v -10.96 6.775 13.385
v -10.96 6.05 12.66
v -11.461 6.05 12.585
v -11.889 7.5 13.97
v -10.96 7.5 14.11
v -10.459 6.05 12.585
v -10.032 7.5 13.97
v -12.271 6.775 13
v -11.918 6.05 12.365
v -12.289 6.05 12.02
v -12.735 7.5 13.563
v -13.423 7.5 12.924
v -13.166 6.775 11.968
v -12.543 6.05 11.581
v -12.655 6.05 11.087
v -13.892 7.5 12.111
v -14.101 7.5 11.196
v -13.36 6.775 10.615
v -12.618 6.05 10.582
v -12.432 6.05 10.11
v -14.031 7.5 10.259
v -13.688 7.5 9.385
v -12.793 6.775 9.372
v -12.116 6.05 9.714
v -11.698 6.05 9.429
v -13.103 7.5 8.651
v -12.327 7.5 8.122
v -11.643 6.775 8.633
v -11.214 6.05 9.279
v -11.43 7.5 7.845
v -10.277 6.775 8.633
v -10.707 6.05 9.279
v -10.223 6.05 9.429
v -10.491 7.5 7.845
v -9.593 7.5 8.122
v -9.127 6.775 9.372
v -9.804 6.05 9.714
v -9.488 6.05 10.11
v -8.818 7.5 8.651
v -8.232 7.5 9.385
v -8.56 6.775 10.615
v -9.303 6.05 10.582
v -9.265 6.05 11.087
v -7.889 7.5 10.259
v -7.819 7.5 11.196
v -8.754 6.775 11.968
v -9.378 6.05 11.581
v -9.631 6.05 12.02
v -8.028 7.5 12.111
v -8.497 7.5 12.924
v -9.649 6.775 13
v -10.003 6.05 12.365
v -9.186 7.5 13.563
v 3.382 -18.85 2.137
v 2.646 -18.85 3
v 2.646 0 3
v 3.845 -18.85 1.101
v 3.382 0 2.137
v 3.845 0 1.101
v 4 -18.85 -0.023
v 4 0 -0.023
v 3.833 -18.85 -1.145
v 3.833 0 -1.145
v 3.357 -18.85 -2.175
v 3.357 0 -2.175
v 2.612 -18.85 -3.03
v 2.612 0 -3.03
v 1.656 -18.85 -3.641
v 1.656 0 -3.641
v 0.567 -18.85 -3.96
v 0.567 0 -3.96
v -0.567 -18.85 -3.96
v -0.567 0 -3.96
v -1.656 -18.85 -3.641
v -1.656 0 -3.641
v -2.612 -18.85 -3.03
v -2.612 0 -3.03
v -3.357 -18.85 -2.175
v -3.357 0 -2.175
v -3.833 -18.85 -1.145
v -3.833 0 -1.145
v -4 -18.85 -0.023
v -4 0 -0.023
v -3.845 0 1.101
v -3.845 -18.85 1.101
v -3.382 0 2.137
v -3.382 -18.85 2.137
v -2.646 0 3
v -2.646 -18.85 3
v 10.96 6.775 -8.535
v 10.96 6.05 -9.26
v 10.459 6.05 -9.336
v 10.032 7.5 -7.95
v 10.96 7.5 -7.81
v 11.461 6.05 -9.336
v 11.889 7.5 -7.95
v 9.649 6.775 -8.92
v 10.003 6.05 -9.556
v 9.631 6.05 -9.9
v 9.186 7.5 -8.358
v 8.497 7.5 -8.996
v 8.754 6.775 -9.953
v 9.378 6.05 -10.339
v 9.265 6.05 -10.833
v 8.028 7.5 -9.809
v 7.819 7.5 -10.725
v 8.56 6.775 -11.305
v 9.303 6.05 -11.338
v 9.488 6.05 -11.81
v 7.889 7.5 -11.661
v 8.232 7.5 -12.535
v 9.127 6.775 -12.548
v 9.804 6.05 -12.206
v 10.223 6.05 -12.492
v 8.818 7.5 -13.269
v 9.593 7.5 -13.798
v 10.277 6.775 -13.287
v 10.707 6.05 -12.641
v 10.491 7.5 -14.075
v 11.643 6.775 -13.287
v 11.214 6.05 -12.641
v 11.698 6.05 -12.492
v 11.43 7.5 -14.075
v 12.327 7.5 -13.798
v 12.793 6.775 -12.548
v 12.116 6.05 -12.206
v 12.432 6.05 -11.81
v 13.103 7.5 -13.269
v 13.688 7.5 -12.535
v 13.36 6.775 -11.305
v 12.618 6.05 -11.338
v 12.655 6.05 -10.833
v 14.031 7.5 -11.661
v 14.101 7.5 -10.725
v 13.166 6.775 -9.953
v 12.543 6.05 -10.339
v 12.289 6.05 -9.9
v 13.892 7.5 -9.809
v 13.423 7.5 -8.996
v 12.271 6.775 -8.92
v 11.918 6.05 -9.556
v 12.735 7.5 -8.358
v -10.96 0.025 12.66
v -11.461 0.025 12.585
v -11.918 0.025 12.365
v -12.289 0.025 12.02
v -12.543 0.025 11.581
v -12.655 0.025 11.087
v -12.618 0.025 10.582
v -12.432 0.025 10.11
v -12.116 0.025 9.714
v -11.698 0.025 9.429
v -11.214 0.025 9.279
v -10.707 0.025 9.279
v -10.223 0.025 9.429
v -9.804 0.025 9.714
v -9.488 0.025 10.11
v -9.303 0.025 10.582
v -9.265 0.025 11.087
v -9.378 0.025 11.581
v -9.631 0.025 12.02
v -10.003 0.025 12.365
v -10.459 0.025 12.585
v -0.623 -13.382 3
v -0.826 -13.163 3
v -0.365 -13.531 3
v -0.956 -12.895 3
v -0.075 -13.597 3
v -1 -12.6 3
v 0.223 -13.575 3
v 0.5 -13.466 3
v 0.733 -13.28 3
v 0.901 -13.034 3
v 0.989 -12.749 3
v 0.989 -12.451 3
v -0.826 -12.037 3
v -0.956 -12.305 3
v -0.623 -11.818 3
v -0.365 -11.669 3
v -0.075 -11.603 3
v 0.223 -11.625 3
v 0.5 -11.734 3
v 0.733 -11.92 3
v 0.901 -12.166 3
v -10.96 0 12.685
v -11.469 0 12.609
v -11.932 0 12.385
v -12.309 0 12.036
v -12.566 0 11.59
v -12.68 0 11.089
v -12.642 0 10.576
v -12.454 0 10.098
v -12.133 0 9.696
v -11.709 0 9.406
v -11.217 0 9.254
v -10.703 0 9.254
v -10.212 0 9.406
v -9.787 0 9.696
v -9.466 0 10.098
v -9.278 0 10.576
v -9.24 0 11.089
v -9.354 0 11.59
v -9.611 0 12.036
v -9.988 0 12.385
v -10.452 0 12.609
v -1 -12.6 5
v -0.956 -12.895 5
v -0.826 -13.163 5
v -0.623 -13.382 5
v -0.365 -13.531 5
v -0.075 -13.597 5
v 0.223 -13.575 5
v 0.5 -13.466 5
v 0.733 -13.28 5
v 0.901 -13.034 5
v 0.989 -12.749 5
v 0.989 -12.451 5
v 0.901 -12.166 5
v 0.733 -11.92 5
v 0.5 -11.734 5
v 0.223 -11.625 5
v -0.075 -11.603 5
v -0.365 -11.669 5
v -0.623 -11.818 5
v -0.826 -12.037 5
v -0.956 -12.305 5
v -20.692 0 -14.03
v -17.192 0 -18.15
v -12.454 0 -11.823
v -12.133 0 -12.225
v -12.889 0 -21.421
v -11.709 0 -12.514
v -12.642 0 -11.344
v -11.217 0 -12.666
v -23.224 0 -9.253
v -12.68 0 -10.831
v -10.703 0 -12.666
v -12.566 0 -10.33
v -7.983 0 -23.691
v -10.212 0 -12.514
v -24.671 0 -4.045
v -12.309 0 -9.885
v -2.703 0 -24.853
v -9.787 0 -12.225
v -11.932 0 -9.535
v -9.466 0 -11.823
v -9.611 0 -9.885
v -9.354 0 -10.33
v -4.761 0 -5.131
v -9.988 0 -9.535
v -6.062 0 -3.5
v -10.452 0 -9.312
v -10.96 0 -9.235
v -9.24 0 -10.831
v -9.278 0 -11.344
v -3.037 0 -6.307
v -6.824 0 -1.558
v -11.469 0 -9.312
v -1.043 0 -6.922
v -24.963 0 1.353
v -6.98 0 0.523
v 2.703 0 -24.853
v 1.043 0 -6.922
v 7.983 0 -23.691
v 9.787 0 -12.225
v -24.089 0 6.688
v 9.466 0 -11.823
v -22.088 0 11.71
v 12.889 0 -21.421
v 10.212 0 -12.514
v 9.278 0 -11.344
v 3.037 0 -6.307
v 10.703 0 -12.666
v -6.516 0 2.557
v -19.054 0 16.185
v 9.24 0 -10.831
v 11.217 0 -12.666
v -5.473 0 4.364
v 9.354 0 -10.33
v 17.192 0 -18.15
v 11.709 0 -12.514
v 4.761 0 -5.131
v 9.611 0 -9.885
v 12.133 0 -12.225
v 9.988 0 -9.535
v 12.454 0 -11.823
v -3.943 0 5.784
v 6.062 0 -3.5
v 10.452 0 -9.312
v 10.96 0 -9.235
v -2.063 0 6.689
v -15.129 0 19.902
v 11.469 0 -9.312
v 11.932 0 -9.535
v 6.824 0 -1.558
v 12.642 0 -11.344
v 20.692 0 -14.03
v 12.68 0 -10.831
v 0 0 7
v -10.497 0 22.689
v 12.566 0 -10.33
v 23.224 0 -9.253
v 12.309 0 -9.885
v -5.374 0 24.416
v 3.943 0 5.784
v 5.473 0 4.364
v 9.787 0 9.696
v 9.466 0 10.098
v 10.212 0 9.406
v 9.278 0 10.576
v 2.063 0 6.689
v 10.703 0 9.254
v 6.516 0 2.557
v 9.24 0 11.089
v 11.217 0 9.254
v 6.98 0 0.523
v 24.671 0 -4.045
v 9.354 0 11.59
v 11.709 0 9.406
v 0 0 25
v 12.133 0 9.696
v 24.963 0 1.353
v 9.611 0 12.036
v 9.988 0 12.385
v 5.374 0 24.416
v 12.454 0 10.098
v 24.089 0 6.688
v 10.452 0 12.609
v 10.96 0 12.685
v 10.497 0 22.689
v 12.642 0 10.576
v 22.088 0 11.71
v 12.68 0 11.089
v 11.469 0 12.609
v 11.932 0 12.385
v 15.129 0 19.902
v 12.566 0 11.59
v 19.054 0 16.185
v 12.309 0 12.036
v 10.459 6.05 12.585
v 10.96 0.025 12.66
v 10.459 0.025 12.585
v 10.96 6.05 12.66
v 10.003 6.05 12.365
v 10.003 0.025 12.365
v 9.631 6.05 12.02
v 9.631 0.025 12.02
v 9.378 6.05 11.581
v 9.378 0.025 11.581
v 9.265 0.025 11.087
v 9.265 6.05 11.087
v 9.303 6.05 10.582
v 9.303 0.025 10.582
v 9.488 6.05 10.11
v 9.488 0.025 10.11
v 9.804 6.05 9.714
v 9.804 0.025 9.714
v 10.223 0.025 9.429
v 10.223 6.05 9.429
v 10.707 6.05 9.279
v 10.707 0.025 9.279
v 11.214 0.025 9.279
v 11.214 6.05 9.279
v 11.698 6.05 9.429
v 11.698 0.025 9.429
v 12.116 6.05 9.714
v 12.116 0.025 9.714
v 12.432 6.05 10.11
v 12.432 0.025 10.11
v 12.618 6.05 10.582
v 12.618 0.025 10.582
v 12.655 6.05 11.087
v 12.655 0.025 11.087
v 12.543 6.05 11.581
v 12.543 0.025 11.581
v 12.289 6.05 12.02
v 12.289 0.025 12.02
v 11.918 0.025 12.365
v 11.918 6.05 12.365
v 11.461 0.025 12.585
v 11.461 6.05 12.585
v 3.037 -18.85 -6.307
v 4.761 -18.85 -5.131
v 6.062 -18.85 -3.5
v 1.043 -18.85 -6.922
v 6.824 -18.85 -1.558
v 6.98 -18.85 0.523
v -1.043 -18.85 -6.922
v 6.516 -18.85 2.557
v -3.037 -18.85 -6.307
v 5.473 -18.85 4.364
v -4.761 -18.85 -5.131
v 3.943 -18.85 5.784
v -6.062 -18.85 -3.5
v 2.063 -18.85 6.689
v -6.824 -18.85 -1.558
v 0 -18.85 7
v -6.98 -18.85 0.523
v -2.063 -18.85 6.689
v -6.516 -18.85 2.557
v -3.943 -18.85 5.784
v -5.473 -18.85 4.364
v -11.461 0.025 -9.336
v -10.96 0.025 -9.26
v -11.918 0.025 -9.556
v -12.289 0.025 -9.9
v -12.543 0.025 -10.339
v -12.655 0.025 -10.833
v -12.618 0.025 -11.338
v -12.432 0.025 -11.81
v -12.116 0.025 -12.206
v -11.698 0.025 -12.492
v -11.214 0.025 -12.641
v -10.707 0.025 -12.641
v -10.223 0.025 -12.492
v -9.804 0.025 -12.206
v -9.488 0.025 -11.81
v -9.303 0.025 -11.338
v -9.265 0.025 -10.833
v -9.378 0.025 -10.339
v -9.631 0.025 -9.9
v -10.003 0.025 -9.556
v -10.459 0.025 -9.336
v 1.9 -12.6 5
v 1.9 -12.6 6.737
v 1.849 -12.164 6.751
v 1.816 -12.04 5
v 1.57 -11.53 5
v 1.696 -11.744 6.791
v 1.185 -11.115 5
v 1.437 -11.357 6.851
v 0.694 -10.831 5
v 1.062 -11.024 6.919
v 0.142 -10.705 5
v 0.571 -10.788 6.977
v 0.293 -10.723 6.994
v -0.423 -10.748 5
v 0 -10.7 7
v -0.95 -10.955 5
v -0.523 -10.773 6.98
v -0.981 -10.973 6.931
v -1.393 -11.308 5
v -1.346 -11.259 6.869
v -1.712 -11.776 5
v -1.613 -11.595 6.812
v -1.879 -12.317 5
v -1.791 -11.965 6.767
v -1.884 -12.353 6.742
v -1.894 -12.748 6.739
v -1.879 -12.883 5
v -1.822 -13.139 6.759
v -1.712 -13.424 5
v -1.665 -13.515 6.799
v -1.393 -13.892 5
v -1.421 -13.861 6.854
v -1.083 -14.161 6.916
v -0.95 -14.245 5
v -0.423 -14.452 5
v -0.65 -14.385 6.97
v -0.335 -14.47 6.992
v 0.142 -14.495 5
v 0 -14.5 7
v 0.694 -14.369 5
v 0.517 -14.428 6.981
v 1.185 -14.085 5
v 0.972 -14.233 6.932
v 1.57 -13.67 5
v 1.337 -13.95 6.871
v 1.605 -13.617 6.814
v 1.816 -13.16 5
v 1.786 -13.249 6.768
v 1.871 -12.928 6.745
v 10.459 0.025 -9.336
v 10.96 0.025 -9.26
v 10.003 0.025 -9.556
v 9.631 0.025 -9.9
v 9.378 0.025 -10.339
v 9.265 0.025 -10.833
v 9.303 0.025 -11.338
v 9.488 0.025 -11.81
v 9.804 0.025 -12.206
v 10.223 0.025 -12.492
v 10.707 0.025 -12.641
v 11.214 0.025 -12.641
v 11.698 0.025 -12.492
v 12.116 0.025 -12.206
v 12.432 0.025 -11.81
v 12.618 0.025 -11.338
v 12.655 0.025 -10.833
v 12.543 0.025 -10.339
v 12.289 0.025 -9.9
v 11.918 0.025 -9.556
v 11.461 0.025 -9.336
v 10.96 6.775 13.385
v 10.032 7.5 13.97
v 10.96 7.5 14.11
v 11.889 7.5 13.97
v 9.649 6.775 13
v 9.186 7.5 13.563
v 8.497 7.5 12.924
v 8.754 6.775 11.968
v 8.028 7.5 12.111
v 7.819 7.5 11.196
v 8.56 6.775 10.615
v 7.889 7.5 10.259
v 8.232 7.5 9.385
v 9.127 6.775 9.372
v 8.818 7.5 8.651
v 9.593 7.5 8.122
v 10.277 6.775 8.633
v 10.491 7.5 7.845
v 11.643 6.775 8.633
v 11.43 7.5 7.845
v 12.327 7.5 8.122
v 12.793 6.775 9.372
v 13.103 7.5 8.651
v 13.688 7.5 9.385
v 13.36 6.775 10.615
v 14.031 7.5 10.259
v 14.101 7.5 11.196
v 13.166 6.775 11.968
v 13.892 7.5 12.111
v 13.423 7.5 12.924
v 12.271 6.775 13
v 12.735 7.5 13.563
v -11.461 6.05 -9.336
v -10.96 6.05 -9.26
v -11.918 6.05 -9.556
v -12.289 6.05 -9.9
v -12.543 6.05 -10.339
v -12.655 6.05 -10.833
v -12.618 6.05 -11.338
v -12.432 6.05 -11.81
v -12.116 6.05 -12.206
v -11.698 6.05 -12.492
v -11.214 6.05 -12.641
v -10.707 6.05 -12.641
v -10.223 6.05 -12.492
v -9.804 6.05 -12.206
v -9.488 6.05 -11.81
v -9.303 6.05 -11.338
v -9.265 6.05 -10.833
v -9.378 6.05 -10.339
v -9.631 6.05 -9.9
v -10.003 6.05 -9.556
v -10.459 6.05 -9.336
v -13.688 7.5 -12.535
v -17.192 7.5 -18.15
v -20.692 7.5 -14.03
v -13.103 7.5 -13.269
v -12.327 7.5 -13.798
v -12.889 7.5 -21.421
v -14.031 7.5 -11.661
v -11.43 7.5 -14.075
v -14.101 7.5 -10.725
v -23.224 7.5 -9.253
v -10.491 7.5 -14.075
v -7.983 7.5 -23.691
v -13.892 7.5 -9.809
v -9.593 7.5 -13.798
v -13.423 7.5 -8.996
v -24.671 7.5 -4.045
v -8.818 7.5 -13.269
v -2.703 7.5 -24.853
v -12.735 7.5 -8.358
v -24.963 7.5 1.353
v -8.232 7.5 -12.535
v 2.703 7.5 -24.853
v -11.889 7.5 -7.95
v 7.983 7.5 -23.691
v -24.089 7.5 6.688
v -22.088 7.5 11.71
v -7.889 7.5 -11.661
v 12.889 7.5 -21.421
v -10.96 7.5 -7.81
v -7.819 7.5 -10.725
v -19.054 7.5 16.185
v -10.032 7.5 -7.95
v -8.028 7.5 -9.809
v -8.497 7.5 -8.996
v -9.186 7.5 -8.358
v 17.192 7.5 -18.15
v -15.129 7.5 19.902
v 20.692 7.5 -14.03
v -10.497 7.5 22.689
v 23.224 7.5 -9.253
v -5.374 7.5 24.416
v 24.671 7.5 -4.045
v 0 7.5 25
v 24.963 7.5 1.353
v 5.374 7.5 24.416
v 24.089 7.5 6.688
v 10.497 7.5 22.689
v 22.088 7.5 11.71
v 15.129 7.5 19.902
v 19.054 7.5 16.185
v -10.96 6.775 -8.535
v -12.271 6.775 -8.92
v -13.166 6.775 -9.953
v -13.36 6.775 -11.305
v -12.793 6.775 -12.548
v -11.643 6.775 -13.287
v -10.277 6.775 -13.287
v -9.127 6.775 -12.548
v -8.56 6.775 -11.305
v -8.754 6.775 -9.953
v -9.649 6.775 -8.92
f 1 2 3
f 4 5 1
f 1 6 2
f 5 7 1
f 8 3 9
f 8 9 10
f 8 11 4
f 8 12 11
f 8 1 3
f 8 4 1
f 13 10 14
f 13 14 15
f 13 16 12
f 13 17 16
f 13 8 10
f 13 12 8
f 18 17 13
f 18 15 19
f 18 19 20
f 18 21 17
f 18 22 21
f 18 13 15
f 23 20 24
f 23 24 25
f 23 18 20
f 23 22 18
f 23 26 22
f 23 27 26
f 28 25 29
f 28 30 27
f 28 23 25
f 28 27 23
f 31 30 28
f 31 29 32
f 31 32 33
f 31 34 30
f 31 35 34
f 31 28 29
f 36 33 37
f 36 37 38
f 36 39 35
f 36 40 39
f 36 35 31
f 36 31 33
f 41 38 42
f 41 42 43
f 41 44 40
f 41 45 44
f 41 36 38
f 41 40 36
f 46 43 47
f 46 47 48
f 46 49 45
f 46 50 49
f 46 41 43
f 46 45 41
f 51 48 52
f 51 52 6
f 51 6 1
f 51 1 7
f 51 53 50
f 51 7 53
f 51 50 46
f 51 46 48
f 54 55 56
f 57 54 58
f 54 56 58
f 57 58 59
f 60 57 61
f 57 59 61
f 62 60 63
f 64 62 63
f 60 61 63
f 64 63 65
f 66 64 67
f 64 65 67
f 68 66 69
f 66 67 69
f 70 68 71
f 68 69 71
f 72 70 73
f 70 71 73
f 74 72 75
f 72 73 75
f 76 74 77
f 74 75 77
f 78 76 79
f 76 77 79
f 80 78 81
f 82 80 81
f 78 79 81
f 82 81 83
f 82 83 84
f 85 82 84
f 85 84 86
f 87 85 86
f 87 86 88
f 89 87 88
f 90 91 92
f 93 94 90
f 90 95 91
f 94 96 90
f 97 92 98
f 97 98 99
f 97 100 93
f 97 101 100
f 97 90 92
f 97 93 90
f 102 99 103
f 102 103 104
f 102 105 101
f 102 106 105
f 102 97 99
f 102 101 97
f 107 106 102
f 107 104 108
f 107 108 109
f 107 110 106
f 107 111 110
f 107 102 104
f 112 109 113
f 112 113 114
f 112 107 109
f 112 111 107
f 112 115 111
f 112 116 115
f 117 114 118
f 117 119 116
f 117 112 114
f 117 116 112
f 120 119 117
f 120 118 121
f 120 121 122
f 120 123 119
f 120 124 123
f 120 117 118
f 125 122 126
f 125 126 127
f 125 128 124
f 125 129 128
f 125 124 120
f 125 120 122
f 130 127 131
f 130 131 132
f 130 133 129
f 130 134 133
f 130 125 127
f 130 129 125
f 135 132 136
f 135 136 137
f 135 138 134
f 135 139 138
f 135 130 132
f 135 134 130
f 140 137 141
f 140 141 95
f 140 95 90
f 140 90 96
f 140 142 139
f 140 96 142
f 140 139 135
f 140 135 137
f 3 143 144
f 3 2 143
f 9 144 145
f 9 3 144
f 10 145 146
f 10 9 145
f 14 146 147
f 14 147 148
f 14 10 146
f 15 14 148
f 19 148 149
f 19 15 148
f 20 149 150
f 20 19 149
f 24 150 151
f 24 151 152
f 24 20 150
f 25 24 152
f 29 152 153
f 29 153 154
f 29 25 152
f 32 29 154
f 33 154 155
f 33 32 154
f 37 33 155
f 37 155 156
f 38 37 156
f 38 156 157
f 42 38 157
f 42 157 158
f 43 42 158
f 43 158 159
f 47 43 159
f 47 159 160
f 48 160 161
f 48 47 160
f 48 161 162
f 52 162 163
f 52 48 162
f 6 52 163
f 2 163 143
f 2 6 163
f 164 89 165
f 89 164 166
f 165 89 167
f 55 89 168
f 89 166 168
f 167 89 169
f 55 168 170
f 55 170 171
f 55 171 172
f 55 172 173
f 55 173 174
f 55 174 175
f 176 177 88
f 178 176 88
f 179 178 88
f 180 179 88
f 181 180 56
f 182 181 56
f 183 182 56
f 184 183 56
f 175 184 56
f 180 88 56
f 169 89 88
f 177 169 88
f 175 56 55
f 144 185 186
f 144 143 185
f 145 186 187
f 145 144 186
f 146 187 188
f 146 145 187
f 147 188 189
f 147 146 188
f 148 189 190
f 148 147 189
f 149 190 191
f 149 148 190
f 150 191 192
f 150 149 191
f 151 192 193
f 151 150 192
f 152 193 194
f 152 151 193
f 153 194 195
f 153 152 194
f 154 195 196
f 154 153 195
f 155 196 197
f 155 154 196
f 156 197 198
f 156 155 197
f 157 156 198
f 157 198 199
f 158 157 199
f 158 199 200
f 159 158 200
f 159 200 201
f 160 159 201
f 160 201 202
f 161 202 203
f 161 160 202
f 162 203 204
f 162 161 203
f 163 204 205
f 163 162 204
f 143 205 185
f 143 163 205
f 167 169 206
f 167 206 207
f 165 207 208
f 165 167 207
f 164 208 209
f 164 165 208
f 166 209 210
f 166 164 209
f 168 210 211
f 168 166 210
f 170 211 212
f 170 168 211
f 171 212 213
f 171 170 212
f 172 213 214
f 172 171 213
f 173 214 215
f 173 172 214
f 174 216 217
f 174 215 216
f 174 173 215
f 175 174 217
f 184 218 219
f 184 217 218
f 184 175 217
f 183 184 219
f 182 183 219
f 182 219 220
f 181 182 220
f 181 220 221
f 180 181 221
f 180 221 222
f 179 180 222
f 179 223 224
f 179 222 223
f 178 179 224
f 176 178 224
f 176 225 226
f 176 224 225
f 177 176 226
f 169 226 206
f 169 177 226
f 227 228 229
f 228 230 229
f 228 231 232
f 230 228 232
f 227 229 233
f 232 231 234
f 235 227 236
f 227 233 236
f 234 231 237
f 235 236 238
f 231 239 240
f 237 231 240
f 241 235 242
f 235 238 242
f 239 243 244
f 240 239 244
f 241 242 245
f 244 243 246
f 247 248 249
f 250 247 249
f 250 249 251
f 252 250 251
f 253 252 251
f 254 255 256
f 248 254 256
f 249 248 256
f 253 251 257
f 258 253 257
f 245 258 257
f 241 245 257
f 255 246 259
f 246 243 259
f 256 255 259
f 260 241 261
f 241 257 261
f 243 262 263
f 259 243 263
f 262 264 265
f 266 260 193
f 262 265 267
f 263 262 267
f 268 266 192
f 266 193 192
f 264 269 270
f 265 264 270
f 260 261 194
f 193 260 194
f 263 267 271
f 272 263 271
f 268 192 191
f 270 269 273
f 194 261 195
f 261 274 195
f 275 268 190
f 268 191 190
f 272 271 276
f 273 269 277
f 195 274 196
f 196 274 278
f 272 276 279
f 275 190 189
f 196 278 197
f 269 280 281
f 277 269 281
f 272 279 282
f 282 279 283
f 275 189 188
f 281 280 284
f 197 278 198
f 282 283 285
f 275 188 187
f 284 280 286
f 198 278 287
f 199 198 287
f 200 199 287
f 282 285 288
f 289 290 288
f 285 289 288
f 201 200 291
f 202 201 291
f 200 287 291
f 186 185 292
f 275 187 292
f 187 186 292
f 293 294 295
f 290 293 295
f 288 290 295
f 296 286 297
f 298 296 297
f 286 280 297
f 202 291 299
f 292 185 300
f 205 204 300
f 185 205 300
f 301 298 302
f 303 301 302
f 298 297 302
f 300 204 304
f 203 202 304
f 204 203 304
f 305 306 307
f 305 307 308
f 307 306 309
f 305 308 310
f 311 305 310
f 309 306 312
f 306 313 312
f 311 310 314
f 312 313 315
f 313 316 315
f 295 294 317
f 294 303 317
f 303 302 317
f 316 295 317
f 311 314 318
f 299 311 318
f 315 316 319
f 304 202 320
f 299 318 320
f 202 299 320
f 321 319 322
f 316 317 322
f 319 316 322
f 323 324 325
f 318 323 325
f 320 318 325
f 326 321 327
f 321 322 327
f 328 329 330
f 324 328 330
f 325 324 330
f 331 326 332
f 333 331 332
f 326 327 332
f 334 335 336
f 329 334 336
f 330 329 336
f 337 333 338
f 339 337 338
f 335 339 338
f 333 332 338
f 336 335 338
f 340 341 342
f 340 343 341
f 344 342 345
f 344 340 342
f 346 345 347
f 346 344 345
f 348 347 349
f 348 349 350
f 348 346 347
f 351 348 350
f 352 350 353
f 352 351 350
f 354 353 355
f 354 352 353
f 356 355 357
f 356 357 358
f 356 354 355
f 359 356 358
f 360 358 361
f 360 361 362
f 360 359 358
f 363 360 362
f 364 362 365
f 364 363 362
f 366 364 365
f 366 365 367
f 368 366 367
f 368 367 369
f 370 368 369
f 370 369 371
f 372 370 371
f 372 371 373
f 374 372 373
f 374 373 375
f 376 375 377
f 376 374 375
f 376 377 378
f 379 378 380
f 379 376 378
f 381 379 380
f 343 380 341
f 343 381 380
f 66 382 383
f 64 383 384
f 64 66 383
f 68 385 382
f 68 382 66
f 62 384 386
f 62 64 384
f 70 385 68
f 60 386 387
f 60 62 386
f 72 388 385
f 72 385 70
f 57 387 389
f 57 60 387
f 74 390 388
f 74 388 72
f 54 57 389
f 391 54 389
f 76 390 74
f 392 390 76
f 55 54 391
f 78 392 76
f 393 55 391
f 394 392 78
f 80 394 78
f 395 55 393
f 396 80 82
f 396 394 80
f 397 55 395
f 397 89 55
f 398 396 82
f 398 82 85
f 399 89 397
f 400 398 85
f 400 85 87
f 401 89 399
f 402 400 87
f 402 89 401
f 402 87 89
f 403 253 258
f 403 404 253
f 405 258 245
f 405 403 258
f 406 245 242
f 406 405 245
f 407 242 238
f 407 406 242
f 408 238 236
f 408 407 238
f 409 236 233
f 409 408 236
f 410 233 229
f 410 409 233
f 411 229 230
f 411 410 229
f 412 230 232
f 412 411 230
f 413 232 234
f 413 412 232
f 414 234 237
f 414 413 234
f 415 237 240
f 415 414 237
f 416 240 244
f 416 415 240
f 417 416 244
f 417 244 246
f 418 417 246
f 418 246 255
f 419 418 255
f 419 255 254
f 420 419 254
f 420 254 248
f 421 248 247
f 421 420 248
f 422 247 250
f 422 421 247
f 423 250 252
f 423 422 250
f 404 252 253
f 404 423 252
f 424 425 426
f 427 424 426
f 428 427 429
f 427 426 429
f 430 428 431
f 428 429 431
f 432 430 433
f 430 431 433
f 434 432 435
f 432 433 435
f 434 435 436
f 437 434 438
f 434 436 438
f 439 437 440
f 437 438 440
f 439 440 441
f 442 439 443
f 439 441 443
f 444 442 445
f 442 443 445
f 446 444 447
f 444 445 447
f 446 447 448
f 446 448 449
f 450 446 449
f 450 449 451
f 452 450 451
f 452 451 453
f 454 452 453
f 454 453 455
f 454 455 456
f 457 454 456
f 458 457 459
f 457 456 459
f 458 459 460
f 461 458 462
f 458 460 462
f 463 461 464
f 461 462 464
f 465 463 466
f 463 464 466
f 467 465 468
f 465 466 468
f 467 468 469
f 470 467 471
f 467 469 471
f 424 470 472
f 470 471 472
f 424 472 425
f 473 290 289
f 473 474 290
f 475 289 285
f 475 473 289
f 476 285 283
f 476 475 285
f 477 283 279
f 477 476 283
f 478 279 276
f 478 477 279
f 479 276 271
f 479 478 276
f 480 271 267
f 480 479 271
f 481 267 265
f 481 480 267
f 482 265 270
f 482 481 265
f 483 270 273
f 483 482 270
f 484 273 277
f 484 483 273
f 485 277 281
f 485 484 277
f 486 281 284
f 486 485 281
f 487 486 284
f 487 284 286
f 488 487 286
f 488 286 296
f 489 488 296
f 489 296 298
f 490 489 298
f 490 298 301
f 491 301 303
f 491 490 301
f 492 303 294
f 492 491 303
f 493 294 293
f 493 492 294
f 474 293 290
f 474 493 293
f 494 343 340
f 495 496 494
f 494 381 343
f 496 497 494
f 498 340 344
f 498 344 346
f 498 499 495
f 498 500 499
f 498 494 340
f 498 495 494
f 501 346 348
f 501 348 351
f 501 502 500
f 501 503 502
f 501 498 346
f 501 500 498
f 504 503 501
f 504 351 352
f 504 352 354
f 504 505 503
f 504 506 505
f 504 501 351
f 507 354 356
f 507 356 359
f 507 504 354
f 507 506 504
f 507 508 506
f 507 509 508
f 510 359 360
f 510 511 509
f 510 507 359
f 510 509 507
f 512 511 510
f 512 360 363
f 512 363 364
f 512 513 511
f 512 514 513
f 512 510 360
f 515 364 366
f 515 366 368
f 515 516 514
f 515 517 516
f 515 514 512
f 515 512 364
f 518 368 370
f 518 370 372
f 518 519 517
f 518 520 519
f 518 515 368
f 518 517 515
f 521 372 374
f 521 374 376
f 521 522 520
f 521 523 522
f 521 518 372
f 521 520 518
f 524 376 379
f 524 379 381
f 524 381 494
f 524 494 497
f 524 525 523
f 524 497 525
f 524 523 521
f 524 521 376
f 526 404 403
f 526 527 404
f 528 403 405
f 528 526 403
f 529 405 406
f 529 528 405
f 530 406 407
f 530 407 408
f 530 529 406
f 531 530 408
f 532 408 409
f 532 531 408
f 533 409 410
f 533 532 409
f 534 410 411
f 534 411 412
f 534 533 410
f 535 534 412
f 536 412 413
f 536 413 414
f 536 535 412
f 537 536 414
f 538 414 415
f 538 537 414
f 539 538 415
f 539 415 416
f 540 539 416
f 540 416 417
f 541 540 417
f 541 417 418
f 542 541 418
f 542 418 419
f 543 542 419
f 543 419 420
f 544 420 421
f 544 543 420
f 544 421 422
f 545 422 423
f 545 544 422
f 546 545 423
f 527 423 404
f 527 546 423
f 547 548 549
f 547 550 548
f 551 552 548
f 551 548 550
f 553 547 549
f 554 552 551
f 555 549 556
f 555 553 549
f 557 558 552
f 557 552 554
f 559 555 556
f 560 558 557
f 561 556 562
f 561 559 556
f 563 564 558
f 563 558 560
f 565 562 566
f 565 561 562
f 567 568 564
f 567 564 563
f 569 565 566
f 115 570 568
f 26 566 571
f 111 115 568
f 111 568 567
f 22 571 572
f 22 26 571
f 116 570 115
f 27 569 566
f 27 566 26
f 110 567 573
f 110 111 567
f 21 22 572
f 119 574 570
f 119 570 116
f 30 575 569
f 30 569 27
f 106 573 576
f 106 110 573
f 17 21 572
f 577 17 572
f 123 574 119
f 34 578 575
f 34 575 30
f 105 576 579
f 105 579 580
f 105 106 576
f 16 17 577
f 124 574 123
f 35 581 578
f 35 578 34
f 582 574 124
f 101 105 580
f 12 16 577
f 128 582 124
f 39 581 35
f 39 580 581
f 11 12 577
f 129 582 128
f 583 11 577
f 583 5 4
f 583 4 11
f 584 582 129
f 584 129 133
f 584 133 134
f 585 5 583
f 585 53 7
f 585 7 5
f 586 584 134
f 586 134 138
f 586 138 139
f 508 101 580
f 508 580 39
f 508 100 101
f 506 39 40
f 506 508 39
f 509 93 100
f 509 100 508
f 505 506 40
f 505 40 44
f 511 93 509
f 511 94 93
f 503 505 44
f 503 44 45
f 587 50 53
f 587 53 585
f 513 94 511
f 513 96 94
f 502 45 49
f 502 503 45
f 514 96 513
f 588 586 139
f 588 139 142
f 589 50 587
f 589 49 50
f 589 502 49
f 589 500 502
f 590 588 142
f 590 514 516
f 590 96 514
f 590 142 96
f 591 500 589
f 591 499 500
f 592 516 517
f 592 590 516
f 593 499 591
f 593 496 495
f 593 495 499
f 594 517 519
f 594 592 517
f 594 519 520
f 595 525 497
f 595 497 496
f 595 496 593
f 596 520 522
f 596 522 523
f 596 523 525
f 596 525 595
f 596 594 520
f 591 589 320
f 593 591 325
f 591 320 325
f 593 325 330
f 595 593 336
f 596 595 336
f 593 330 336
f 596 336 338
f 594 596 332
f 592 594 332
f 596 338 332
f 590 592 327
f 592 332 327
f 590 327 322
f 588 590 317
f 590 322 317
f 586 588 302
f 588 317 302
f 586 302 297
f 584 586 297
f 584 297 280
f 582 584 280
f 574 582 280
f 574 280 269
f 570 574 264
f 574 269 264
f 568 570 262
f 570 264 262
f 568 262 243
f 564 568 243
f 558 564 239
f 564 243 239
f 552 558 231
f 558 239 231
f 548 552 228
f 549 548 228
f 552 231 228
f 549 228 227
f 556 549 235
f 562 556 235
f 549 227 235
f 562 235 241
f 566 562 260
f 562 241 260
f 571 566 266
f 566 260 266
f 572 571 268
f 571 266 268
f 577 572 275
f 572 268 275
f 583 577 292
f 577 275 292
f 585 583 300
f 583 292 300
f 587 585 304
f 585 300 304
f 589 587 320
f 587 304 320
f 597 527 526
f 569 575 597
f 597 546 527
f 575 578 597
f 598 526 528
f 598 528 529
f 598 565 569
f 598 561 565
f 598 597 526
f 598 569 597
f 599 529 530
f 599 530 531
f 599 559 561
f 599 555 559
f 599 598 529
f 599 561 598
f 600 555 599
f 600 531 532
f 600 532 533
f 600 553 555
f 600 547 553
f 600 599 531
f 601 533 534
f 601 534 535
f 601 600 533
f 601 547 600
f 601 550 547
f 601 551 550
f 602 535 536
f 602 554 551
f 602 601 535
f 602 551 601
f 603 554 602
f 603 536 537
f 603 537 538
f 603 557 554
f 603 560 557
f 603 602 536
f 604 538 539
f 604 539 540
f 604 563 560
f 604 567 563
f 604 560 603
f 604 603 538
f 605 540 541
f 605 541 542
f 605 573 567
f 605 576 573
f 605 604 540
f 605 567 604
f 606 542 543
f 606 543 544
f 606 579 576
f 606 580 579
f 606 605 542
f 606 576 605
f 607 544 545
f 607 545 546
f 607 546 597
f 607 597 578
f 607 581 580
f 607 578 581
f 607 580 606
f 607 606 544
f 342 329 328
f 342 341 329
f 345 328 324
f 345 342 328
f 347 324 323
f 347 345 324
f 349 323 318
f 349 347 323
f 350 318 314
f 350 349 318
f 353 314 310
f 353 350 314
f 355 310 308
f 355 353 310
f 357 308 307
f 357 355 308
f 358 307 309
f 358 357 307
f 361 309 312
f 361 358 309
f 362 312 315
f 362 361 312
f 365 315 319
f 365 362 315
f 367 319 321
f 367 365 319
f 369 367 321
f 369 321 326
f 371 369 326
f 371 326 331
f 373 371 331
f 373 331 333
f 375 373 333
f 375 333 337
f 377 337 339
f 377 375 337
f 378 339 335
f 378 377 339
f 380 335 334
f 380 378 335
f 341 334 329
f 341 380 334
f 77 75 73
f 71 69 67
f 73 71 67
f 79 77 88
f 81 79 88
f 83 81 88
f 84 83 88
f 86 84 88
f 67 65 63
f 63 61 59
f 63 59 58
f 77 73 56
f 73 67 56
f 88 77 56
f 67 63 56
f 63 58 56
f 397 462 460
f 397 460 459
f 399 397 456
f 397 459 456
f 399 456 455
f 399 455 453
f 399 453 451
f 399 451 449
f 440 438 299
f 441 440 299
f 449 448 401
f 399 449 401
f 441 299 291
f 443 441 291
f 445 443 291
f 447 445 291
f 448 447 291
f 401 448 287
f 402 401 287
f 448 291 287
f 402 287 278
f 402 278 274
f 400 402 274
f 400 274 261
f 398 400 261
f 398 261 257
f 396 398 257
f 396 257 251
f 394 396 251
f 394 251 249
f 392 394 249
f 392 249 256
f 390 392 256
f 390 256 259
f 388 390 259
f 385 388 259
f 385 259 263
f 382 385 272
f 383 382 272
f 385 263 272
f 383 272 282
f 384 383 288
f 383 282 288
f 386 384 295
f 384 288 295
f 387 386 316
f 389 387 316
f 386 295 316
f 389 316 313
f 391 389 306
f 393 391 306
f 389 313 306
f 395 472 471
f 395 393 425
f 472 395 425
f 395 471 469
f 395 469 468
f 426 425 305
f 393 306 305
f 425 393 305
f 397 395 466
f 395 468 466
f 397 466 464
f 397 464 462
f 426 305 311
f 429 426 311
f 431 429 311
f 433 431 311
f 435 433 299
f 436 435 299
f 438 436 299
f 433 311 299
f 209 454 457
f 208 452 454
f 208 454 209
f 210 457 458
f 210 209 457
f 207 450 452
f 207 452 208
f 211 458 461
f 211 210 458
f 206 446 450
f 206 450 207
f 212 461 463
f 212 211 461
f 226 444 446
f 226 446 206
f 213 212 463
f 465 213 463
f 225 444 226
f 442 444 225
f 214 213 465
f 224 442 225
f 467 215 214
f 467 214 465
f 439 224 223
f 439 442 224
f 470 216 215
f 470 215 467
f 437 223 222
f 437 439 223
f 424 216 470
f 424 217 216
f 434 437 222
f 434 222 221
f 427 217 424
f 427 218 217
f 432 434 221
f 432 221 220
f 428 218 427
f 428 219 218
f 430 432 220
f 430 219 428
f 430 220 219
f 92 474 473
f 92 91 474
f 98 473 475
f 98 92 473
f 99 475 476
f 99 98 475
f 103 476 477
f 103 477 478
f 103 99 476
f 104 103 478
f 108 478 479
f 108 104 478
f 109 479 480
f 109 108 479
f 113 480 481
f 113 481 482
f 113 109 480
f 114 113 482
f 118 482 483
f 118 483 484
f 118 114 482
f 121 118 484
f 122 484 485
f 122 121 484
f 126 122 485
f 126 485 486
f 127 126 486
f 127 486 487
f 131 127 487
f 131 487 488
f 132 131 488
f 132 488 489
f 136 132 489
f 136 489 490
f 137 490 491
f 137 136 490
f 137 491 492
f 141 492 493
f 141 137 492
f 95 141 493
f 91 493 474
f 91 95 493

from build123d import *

# Parameters (mm, degrees)
SKETCH1_R                                      = 25
BOSS_EXTRUDE1_DEPTH                            = 7.5
CSK_FOR_M3_FLAT_HEAD_MACHINE_SCREW1_AT_2_COUNT = 2
CSK_FOR_M3_FLAT_HEAD_MACHINE_SCREW1_AT_2_PITCH = 21.920310217
CSK_FOR_M3_FLAT_HEAD_MACHINE_SCREW1_AT_3_COUNT = 2
CSK_FOR_M3_FLAT_HEAD_MACHINE_SCREW1_AT_3_PITCH = 31
CSK_FOR_M3_FLAT_HEAD_MACHINE_SCREW1_AT_4_COUNT = 2
CSK_FOR_M3_FLAT_HEAD_MACHINE_SCREW1_AT_4_PITCH = 21.920310217
SKETCH6_R                                      = 7
BOSS_EXTRUDE2_DEPTH                            = 18.85
SKETCH7_R                                      = 1
CUT_EXTRUDE1_DEPTH                             = 10.5
SKETCH11_R                                     = 1.9
CUT_EXTRUDE2_DEPTH                             = 2


with BuildPart() as part:
    # Sketch1 → Boss-Extrude1 (new body)
    with BuildSketch(Plane(origin=(0, 0, 0), x_dir=(1, 0, 0), z_dir=(0, 1, 0))):
        with Locations(Location((0, 0, 0), (0, 0, 270))):
            Circle(SKETCH1_R)
    extrude(amount=BOSS_EXTRUDE1_DEPTH)

    # Sketch5 → CSK for M3 Flat Head Machine Screw1 (revolve, cut)
    with BuildSketch(Plane(origin=(-10.960155108, 7.5, -10.960155108), x_dir=(0, 0, 1), z_dir=(1, 0, 0))):
        Polygon((0, 0), (0, 7.5), (1.725, 7.5), (1.7, 7.475), (1.7, 1.45), (3.15, 0), align=None)
    csk_for_m3_flat_head_machine_screw1 = revolve(axis=Axis((-10.960155108, 13.85, -10.960155108), (0, -1, 0)), mode=Mode.SUBTRACT)

    # CSK for M3 Flat Head Machine Screw1 at 2: CSK for M3 Flat Head Machine Screw1 ×2
    with Locations(*[(i * CSK_FOR_M3_FLAT_HEAD_MACHINE_SCREW1_AT_2_PITCH, 0, 0) for i in range(1, CSK_FOR_M3_FLAT_HEAD_MACHINE_SCREW1_AT_2_COUNT)]):
        add(csk_for_m3_flat_head_machine_screw1, mode=Mode.SUBTRACT)

    # CSK for M3 Flat Head Machine Screw1 at 3: CSK for M3 Flat Head Machine Screw1 ×2
    with Locations(*[Vector(0.7071067811865475, 0, 0.7071067811865476) * (i * CSK_FOR_M3_FLAT_HEAD_MACHINE_SCREW1_AT_3_PITCH) for i in range(1, CSK_FOR_M3_FLAT_HEAD_MACHINE_SCREW1_AT_3_COUNT)]):
        add(csk_for_m3_flat_head_machine_screw1, mode=Mode.SUBTRACT)

    # CSK for M3 Flat Head Machine Screw1 at 4: CSK for M3 Flat Head Machine Screw1 ×2
    with Locations(*[(0, 0, i * CSK_FOR_M3_FLAT_HEAD_MACHINE_SCREW1_AT_4_PITCH) for i in range(1, CSK_FOR_M3_FLAT_HEAD_MACHINE_SCREW1_AT_4_COUNT)]):
        add(csk_for_m3_flat_head_machine_screw1, mode=Mode.SUBTRACT)

    # Sketch6 → Boss-Extrude2 (add)
    with BuildSketch(Plane.XZ):
        with Locations(Location((0, 0, 0), (0, 0, 90))):
            Circle(SKETCH6_R)
        with BuildLine():
            Line((-2.645751311, 3), (2.645751311, 3))
            ThreePointArc((2.645751311, 3), (0, -4), (-2.645751311, 3))
        make_face(mode=Mode.SUBTRACT)
    extrude(amount=BOSS_EXTRUDE2_DEPTH)

    # Sketch7 → Cut-Extrude1 (cut)
    with BuildSketch(Plane.XY):
        with Locations(Location((0, -12.6, 0), (0, 0, 180))):
            Circle(SKETCH7_R)
    extrude(amount=CUT_EXTRUDE1_DEPTH, mode=Mode.SUBTRACT)

    # Sketch11 → Cut-Extrude2 (cut)
    with BuildSketch(Plane.XY.offset(7)):
        with Locations((0, -12.6)):
            Circle(SKETCH11_R)
    extrude(amount=-CUT_EXTRUDE2_DEPTH, mode=Mode.SUBTRACT)


solid = part.part
